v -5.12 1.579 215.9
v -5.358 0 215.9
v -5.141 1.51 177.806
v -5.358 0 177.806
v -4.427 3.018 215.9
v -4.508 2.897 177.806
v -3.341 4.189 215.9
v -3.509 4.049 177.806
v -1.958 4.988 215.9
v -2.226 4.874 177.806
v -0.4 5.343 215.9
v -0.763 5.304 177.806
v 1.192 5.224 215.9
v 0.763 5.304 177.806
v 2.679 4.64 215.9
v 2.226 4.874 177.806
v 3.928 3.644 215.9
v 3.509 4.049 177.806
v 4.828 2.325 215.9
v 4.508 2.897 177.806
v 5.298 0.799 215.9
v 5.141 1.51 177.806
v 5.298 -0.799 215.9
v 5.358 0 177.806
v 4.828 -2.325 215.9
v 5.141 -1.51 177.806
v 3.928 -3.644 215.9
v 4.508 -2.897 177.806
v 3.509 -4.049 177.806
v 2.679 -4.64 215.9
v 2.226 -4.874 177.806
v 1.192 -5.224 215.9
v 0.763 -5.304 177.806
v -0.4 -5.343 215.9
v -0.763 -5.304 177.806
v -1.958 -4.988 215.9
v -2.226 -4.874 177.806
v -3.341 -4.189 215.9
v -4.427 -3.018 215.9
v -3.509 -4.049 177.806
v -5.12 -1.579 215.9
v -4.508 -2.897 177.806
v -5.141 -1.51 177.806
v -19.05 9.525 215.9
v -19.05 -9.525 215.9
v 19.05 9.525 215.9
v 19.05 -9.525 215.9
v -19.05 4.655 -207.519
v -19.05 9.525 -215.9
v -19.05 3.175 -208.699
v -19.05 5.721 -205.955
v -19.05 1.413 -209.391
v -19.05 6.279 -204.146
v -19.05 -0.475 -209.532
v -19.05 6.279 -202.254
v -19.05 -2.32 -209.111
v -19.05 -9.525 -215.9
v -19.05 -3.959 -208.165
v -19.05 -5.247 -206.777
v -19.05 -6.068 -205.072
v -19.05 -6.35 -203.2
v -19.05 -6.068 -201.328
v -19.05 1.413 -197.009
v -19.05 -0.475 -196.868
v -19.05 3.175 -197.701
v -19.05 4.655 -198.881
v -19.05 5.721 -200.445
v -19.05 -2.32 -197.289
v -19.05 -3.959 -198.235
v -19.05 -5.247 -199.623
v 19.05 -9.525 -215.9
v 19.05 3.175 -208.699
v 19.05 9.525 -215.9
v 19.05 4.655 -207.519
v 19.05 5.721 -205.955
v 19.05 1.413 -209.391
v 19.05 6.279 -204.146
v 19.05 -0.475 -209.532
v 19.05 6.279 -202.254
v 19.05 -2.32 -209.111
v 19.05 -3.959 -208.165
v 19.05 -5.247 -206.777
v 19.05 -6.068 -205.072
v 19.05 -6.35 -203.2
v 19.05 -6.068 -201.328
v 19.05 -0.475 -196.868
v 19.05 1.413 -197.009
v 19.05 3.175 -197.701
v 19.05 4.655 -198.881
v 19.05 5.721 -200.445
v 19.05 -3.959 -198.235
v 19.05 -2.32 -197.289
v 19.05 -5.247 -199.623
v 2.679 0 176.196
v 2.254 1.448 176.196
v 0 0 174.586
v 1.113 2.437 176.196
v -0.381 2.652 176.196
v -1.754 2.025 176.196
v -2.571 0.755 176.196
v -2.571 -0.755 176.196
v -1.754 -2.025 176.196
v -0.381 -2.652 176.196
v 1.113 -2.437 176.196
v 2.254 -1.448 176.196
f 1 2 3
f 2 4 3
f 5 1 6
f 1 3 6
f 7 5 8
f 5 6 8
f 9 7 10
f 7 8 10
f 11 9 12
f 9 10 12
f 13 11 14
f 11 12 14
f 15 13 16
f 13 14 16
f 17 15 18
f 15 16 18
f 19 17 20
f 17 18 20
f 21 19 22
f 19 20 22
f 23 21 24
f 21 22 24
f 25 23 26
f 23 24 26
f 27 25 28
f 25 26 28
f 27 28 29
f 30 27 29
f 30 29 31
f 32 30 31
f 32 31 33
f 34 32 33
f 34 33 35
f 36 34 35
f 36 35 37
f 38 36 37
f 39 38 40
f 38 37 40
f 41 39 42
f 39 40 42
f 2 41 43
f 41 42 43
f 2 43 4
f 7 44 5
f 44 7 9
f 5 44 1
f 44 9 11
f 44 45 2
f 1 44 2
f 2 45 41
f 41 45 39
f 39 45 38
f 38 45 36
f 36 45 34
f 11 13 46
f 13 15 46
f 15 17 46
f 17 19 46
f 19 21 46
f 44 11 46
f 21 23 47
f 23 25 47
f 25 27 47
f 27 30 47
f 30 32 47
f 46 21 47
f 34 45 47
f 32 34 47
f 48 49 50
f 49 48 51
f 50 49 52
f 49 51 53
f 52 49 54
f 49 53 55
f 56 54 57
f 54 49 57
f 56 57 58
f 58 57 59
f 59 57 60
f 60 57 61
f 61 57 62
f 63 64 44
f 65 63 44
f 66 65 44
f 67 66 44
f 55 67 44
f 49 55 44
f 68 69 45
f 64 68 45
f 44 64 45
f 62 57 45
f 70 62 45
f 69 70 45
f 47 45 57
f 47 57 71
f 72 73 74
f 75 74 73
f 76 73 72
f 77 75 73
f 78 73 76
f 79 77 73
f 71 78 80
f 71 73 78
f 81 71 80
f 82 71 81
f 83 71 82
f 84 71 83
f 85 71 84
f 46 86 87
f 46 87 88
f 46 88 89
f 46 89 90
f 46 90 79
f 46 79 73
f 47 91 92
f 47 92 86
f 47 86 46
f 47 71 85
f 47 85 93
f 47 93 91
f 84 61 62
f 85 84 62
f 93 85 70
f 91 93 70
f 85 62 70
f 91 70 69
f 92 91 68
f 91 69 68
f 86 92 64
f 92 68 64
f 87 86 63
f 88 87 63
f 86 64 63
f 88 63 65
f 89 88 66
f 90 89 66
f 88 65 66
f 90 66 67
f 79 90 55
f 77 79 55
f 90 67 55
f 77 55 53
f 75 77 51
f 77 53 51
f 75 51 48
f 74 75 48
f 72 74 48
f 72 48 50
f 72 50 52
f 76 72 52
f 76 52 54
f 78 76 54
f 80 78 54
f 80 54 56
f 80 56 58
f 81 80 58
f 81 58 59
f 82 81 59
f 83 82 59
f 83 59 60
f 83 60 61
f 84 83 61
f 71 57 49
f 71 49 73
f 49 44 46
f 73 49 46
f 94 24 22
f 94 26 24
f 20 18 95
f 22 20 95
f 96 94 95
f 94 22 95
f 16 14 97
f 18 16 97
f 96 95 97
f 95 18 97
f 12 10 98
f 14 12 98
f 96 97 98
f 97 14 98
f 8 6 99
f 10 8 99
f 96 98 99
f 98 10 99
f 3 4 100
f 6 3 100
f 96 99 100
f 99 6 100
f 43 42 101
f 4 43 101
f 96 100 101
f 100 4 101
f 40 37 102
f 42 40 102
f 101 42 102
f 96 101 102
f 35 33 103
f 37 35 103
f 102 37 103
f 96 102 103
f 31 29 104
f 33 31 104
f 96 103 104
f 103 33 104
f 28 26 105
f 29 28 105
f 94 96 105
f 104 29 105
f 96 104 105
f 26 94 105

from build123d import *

# Parameters (mm, degrees)
F0_W     = 38.1
F0_H     = 431.8
F1_DEPTH = 9.525
F3_D     = 12.7
F5_D     = 10.71626
F5_DEPTH = 38.0941384615
F5_TIP   = 3.2194893086


# Not quite as in the source:
# - a length typed as a fraction of an inch, garbled in the dataset ("3 / 203.2 mm" for 3/8 in), is restored


with BuildPart() as f1:
    # F0 (on Front) → F1 (new body, symmetric)
    with BuildSketch(Plane.XZ):
        Rectangle(F0_W, F0_H)
    extrude(amount=F1_DEPTH, both=True)

    # F3 (through all)
    with Locations(Plane.YZ.offset(19.05)):
        with Locations((0, -203.2)):
            Hole(F3_D / 2)

    # F5
    with Locations(Plane.XY.offset(215.9)):
        with Locations((0, 0)):
            Hole(F5_D / 2, depth=F5_DEPTH)
            with Locations((0, 0, -(F5_DEPTH + F5_TIP / 2))):  # 118° drill point
                Cone(0, F5_D / 2, F5_TIP, mode=Mode.SUBTRACT)


solid = f1.part
